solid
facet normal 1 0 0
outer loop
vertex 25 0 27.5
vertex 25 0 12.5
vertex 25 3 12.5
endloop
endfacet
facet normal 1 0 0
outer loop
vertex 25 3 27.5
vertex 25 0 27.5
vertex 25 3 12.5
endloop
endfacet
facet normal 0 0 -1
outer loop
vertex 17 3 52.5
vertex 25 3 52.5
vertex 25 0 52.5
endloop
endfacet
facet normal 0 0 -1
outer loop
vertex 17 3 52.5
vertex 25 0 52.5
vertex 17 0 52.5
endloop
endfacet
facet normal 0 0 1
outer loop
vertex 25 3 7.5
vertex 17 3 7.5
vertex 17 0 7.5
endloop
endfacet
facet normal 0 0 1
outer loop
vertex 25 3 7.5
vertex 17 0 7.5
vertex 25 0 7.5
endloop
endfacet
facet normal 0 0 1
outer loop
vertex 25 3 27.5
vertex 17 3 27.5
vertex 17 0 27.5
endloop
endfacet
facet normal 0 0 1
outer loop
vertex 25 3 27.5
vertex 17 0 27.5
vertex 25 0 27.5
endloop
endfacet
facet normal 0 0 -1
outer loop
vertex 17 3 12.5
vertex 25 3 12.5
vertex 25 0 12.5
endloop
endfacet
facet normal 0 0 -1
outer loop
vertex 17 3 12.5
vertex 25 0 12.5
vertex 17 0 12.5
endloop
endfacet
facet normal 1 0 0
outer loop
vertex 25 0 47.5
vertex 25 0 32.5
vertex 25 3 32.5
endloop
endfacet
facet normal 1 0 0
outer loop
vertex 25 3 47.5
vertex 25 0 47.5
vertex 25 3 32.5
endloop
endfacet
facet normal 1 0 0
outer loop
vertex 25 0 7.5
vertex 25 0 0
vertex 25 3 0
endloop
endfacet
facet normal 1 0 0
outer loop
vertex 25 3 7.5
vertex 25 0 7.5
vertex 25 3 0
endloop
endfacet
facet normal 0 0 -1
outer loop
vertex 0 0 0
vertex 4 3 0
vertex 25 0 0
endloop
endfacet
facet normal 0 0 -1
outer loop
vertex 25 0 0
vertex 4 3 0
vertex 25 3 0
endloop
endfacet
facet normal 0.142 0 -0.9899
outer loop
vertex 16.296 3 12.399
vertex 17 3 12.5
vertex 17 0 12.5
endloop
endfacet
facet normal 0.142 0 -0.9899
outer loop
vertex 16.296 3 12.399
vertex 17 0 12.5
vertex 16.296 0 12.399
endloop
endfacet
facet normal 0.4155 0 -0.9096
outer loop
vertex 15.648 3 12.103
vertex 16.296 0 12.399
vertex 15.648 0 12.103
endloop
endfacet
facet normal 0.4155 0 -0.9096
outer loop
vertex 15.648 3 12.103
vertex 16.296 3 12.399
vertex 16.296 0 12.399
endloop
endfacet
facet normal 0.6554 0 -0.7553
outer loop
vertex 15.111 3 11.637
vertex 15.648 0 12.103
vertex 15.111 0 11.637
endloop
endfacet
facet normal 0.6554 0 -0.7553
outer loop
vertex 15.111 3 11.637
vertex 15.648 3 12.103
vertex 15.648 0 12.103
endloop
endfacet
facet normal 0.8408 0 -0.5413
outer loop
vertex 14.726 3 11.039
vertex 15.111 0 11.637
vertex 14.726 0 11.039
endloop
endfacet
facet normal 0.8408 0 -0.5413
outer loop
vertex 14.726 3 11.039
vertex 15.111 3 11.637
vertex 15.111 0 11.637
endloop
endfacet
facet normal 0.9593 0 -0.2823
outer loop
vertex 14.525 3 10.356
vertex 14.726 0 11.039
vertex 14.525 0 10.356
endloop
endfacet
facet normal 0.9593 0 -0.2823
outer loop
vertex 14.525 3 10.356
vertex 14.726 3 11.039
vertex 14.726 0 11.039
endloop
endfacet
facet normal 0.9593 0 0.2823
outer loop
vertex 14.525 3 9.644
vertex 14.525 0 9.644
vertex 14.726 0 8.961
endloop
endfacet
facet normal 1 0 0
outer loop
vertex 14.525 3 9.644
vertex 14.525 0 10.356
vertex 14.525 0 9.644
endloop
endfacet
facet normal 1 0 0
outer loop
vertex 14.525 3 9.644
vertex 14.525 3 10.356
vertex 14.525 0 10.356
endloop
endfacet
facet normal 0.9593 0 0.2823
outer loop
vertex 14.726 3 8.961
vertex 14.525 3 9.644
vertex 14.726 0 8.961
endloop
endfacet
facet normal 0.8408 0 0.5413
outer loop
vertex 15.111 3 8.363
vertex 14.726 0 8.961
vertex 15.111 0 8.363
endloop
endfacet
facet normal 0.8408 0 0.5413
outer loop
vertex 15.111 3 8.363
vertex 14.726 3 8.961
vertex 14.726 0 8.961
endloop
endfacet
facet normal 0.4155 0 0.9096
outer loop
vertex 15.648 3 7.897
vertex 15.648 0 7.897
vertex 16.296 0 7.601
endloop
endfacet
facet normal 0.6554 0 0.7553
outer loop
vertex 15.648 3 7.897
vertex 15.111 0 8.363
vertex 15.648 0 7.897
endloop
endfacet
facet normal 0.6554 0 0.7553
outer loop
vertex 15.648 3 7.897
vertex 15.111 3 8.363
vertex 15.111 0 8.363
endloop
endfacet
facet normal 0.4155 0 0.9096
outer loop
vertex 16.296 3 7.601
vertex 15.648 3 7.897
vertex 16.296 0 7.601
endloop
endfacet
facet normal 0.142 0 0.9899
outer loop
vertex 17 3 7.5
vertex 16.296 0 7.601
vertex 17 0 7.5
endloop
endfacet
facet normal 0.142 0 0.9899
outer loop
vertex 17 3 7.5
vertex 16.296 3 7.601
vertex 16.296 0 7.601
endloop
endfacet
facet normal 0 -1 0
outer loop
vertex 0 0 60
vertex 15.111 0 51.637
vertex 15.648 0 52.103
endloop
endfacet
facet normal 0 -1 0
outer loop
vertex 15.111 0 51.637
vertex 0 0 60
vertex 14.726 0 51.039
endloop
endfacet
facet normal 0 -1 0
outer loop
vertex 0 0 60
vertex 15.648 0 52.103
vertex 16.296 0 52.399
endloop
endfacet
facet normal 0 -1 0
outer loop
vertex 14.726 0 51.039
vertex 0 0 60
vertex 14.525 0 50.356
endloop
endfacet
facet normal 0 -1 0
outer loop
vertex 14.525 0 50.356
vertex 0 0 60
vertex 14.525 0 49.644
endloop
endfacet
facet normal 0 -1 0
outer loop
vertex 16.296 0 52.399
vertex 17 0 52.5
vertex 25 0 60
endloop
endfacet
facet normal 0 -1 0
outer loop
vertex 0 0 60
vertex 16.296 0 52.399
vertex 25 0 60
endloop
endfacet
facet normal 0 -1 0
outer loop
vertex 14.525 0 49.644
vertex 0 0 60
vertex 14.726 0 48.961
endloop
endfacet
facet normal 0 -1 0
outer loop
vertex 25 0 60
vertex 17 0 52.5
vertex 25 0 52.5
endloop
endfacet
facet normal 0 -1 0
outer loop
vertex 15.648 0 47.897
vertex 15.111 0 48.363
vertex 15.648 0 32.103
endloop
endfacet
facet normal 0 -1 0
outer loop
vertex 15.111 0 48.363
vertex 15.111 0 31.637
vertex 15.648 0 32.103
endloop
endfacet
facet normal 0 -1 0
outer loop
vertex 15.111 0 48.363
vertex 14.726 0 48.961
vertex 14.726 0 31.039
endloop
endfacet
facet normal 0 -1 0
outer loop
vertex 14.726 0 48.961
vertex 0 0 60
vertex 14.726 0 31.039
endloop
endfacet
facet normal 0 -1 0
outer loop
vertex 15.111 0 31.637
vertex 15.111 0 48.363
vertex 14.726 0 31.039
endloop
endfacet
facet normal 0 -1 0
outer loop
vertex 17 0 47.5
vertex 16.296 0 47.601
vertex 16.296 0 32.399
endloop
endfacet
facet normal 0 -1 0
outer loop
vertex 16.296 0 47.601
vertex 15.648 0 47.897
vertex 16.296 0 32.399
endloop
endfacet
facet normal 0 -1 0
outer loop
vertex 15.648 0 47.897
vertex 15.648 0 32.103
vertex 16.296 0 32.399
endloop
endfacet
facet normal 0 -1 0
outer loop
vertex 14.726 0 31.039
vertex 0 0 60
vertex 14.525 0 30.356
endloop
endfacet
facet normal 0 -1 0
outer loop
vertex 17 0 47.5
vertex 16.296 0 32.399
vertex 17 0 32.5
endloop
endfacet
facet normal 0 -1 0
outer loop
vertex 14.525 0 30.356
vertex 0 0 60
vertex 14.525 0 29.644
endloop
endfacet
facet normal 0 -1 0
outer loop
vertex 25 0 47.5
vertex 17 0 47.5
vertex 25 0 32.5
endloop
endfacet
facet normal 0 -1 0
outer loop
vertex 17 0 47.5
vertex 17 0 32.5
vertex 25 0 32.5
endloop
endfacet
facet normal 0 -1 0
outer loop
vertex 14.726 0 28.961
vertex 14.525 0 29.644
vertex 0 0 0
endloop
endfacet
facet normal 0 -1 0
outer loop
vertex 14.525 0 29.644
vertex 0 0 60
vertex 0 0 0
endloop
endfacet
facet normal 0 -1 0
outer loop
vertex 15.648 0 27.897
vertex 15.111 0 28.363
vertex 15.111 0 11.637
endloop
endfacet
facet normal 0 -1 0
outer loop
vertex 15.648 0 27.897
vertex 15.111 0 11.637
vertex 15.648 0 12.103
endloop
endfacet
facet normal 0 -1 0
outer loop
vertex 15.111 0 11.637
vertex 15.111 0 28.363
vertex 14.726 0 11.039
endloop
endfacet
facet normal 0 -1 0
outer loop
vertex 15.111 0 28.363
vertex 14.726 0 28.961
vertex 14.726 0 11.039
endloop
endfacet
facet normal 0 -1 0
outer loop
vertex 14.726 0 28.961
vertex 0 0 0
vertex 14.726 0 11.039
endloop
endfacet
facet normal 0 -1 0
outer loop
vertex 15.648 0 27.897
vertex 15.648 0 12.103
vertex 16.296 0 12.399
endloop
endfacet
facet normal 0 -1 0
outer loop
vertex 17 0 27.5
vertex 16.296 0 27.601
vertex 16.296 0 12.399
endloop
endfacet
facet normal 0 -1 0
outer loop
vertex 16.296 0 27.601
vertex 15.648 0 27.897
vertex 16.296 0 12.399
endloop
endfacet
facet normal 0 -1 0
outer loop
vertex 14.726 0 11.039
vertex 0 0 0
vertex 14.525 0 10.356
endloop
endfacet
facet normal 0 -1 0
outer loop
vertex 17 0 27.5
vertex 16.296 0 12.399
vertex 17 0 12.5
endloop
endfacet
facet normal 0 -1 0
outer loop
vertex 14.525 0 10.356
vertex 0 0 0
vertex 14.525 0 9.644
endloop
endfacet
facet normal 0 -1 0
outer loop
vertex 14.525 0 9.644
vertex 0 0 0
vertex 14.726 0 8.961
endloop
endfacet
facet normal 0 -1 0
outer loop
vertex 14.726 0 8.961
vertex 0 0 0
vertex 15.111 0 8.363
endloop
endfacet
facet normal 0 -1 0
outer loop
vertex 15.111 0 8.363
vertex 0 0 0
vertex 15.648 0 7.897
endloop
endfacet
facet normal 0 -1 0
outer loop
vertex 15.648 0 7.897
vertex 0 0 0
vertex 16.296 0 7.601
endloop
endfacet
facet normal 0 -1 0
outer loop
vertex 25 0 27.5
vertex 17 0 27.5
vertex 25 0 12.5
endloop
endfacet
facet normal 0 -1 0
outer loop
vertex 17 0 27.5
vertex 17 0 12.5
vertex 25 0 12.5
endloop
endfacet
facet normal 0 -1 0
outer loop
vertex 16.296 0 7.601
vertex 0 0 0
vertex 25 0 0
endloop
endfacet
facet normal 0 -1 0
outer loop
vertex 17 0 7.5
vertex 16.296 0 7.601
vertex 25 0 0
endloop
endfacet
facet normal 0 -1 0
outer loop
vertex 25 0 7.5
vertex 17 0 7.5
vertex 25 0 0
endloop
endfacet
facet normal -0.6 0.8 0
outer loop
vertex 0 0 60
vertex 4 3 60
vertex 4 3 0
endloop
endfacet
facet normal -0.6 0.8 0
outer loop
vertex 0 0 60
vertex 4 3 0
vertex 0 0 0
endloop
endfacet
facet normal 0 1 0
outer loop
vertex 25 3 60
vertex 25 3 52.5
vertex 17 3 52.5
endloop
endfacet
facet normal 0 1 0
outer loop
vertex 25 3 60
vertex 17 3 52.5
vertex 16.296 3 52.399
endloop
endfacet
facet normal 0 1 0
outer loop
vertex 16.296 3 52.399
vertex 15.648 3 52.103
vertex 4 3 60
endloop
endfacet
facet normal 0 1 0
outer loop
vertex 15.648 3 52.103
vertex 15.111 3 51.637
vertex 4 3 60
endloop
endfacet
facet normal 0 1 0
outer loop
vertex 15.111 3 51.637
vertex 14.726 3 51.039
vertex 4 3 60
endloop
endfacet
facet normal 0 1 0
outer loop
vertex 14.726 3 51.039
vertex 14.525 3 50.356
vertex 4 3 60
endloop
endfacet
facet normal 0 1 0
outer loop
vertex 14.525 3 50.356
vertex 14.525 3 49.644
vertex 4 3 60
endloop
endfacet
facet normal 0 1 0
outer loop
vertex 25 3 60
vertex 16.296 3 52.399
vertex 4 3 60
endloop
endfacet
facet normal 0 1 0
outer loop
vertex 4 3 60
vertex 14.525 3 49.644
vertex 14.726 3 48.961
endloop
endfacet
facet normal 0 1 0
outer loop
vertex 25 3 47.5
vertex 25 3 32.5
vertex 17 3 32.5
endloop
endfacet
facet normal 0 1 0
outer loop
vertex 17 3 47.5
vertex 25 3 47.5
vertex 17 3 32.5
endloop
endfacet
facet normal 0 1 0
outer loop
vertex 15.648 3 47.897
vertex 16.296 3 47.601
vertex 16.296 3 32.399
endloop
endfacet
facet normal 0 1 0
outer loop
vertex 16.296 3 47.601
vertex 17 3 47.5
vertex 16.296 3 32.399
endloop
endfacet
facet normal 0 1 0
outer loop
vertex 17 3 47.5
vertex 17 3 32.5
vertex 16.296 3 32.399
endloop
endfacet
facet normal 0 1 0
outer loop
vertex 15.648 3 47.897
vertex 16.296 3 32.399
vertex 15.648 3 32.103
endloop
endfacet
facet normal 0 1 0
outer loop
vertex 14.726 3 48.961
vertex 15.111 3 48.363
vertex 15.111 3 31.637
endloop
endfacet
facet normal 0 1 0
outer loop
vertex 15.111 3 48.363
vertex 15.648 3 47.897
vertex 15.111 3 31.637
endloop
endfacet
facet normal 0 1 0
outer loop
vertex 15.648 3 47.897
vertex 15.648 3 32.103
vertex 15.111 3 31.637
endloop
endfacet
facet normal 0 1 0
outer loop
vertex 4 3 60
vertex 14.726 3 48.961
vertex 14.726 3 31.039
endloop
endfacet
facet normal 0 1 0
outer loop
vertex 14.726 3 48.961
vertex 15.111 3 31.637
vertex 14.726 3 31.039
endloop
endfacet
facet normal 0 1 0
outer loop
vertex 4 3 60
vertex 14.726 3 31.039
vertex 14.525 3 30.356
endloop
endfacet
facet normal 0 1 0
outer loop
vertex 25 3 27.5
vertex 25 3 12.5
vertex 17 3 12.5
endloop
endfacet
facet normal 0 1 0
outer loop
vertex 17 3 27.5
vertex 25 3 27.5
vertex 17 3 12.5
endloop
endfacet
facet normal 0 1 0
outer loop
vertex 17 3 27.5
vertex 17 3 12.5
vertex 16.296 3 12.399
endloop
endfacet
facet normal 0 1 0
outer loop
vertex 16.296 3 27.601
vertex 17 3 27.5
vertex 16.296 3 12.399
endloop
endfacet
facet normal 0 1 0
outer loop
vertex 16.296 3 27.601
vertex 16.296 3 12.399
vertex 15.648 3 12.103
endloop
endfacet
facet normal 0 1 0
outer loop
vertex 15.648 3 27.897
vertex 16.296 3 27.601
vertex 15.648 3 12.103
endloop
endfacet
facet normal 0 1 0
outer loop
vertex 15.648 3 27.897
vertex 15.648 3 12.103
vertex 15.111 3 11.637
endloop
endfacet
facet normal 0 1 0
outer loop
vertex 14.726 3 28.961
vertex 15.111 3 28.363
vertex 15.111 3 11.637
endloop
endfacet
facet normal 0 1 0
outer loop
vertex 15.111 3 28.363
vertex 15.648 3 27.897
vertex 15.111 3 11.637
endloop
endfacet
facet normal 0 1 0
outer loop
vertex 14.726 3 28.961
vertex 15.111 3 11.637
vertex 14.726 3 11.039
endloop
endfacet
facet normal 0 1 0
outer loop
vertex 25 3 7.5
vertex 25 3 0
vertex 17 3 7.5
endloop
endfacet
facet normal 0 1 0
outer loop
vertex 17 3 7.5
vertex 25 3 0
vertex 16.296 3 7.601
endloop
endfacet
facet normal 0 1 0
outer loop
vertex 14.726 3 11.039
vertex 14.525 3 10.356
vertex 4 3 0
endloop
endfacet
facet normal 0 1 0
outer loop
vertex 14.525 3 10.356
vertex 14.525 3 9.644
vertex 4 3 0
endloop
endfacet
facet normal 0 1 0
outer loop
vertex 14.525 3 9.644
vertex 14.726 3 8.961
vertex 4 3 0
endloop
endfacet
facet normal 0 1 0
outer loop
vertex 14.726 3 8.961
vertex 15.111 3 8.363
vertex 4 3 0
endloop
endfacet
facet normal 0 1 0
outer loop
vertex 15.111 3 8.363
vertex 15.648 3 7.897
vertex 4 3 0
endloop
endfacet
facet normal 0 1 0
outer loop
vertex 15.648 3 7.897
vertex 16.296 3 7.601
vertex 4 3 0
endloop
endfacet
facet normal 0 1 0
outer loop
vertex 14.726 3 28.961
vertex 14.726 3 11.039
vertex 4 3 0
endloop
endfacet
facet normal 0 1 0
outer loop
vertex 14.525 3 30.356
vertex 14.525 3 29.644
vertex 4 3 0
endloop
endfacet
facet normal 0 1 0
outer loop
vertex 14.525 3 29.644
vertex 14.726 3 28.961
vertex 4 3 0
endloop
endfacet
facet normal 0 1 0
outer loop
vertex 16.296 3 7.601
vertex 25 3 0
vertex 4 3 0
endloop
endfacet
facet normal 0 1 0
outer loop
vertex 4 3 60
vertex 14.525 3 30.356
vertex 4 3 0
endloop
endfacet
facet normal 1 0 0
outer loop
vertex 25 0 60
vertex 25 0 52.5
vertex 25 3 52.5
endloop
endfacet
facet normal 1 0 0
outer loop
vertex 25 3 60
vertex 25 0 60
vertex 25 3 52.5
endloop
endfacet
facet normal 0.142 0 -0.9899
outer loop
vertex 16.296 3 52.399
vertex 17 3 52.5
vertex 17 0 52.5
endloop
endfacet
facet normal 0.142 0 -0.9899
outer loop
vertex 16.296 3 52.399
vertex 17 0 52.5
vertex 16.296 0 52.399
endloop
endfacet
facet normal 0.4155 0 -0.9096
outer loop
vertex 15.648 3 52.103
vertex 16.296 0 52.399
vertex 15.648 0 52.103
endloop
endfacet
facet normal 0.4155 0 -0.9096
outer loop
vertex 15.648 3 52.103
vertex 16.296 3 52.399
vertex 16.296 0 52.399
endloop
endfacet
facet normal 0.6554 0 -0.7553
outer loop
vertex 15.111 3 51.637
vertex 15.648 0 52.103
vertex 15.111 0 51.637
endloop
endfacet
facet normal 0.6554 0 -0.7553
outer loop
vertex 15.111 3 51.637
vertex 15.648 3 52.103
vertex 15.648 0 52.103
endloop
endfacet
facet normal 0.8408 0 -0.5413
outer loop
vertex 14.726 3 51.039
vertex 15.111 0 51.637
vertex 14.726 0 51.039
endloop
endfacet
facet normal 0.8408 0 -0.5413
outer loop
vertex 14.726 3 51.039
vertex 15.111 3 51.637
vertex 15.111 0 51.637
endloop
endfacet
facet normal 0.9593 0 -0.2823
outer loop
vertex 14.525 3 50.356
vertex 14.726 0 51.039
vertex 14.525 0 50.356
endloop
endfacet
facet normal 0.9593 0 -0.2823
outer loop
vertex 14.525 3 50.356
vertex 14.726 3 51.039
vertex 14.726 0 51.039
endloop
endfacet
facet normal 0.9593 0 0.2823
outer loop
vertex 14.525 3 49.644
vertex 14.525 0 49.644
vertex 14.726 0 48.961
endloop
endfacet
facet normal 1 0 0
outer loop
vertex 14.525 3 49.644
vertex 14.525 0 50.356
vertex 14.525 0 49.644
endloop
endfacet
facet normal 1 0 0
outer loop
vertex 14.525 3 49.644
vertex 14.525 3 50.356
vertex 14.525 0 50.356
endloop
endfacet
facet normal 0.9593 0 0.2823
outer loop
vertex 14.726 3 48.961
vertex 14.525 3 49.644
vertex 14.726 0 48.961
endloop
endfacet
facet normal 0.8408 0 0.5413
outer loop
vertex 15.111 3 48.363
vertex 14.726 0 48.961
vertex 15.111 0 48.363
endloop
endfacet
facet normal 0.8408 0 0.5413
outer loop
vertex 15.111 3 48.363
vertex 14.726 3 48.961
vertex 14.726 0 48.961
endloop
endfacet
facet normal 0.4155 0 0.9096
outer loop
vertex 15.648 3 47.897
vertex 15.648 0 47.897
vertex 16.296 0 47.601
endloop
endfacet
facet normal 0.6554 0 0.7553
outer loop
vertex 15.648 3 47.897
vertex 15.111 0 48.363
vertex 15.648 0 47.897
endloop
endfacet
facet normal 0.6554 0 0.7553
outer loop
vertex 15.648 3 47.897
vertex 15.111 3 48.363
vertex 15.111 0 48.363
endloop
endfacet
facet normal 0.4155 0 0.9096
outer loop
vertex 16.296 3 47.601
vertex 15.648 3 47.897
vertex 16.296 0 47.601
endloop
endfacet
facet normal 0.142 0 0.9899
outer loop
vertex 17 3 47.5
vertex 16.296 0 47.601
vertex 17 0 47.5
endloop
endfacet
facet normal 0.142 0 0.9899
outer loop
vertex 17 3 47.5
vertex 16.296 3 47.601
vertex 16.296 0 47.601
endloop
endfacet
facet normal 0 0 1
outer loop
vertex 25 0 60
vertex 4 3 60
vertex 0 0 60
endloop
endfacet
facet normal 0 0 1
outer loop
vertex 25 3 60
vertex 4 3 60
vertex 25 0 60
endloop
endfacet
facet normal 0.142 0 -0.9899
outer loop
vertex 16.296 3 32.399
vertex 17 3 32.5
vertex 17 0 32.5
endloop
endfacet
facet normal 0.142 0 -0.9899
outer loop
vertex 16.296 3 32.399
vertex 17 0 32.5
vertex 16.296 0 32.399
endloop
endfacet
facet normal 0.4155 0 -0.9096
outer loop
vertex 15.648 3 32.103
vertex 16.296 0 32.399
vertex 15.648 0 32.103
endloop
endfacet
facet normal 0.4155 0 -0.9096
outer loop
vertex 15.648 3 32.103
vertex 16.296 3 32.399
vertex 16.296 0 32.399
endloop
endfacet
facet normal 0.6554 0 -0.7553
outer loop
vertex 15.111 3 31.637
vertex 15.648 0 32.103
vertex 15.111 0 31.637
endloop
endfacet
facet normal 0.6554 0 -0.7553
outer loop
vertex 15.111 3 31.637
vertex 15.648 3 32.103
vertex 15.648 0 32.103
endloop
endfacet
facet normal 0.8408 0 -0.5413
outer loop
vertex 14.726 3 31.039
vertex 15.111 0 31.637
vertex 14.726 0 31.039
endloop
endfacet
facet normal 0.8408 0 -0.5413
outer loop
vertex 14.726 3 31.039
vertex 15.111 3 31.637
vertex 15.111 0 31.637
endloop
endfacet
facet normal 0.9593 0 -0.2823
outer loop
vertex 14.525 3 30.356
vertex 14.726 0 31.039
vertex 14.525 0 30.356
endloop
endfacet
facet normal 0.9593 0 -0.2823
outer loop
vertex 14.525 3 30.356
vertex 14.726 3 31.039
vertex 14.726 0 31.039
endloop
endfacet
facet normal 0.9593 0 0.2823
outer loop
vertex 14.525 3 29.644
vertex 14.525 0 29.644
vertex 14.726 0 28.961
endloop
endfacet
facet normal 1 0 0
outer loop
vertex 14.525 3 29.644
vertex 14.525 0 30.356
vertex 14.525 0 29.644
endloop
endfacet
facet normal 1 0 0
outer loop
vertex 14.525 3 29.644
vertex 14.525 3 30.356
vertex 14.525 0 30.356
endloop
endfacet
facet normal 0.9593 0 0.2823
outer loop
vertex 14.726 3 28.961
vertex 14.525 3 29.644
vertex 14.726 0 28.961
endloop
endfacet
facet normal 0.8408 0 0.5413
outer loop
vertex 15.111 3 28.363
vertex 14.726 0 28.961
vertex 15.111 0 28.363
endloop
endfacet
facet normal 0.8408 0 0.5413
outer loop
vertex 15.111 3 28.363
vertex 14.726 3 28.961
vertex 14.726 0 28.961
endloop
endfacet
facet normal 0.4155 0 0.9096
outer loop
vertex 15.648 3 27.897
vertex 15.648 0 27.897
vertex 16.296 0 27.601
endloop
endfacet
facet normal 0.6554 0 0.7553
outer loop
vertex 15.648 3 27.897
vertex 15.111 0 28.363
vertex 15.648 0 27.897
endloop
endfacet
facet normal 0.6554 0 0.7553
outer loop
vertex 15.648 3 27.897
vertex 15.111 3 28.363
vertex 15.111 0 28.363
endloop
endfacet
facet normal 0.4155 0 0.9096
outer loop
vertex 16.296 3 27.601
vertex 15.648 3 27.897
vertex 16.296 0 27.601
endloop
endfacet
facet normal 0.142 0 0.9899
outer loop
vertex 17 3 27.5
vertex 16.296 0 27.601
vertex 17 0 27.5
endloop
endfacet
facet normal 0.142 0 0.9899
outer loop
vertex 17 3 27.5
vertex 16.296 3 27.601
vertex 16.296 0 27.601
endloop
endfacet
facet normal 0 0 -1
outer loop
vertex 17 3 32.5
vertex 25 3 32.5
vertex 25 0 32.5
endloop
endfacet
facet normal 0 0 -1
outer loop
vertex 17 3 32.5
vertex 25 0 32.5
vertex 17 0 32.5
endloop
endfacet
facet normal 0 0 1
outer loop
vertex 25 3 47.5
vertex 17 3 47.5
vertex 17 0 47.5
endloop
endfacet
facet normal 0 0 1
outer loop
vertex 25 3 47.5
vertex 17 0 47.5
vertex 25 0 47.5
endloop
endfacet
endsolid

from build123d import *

# Parameters (mm, degrees)
AUFSATZ_LINEAR_AUSTRAGEN1_DEPTH = 60
SCHNITT_LINEAR_AUSTRAGEN1_DEPTH = 4


with BuildPart() as part:
    # Skizze1 → Aufsatz-Linear austragen1 (new body)
    with BuildSketch(Plane.XY):
        Polygon((0, 0), (25, 0), (25, 3), (4, 3), align=None)
    extrude(amount=AUFSATZ_LINEAR_AUSTRAGEN1_DEPTH)

    # Skizze2 → Schnitt-Linear austragen1 (cut, through all)
    with BuildSketch(Plane(origin=(0, 3, 0), x_dir=(1, 0, 0), z_dir=(0, 1, 0))):
        with BuildLine():
            Line((25, -52.5), (17, -52.5))
            ThreePointArc((17, -52.5), (14.5, -50), (17, -47.5))
            Line((17, -47.5), (25, -47.5))
            Line((25, -47.5), (25, -52.5))
        make_face()
        with BuildLine():
            Line((25, -32.5), (17, -32.5))
            ThreePointArc((17, -32.5), (14.5, -30), (17, -27.5))
            Line((17, -27.5), (25, -27.5))
            Line((25, -27.5), (25, -32.5))
        make_face()
        with BuildLine():
            Line((25, -12.5), (17, -12.5))
            ThreePointArc((17, -12.5), (14.5, -10), (17, -7.5))
            Line((17, -7.5), (25, -7.5))
            Line((25, -7.5), (25, -12.5))
        make_face()
    extrude(amount=-SCHNITT_LINEAR_AUSTRAGEN1_DEPTH, mode=Mode.SUBTRACT)


solid = part.part
